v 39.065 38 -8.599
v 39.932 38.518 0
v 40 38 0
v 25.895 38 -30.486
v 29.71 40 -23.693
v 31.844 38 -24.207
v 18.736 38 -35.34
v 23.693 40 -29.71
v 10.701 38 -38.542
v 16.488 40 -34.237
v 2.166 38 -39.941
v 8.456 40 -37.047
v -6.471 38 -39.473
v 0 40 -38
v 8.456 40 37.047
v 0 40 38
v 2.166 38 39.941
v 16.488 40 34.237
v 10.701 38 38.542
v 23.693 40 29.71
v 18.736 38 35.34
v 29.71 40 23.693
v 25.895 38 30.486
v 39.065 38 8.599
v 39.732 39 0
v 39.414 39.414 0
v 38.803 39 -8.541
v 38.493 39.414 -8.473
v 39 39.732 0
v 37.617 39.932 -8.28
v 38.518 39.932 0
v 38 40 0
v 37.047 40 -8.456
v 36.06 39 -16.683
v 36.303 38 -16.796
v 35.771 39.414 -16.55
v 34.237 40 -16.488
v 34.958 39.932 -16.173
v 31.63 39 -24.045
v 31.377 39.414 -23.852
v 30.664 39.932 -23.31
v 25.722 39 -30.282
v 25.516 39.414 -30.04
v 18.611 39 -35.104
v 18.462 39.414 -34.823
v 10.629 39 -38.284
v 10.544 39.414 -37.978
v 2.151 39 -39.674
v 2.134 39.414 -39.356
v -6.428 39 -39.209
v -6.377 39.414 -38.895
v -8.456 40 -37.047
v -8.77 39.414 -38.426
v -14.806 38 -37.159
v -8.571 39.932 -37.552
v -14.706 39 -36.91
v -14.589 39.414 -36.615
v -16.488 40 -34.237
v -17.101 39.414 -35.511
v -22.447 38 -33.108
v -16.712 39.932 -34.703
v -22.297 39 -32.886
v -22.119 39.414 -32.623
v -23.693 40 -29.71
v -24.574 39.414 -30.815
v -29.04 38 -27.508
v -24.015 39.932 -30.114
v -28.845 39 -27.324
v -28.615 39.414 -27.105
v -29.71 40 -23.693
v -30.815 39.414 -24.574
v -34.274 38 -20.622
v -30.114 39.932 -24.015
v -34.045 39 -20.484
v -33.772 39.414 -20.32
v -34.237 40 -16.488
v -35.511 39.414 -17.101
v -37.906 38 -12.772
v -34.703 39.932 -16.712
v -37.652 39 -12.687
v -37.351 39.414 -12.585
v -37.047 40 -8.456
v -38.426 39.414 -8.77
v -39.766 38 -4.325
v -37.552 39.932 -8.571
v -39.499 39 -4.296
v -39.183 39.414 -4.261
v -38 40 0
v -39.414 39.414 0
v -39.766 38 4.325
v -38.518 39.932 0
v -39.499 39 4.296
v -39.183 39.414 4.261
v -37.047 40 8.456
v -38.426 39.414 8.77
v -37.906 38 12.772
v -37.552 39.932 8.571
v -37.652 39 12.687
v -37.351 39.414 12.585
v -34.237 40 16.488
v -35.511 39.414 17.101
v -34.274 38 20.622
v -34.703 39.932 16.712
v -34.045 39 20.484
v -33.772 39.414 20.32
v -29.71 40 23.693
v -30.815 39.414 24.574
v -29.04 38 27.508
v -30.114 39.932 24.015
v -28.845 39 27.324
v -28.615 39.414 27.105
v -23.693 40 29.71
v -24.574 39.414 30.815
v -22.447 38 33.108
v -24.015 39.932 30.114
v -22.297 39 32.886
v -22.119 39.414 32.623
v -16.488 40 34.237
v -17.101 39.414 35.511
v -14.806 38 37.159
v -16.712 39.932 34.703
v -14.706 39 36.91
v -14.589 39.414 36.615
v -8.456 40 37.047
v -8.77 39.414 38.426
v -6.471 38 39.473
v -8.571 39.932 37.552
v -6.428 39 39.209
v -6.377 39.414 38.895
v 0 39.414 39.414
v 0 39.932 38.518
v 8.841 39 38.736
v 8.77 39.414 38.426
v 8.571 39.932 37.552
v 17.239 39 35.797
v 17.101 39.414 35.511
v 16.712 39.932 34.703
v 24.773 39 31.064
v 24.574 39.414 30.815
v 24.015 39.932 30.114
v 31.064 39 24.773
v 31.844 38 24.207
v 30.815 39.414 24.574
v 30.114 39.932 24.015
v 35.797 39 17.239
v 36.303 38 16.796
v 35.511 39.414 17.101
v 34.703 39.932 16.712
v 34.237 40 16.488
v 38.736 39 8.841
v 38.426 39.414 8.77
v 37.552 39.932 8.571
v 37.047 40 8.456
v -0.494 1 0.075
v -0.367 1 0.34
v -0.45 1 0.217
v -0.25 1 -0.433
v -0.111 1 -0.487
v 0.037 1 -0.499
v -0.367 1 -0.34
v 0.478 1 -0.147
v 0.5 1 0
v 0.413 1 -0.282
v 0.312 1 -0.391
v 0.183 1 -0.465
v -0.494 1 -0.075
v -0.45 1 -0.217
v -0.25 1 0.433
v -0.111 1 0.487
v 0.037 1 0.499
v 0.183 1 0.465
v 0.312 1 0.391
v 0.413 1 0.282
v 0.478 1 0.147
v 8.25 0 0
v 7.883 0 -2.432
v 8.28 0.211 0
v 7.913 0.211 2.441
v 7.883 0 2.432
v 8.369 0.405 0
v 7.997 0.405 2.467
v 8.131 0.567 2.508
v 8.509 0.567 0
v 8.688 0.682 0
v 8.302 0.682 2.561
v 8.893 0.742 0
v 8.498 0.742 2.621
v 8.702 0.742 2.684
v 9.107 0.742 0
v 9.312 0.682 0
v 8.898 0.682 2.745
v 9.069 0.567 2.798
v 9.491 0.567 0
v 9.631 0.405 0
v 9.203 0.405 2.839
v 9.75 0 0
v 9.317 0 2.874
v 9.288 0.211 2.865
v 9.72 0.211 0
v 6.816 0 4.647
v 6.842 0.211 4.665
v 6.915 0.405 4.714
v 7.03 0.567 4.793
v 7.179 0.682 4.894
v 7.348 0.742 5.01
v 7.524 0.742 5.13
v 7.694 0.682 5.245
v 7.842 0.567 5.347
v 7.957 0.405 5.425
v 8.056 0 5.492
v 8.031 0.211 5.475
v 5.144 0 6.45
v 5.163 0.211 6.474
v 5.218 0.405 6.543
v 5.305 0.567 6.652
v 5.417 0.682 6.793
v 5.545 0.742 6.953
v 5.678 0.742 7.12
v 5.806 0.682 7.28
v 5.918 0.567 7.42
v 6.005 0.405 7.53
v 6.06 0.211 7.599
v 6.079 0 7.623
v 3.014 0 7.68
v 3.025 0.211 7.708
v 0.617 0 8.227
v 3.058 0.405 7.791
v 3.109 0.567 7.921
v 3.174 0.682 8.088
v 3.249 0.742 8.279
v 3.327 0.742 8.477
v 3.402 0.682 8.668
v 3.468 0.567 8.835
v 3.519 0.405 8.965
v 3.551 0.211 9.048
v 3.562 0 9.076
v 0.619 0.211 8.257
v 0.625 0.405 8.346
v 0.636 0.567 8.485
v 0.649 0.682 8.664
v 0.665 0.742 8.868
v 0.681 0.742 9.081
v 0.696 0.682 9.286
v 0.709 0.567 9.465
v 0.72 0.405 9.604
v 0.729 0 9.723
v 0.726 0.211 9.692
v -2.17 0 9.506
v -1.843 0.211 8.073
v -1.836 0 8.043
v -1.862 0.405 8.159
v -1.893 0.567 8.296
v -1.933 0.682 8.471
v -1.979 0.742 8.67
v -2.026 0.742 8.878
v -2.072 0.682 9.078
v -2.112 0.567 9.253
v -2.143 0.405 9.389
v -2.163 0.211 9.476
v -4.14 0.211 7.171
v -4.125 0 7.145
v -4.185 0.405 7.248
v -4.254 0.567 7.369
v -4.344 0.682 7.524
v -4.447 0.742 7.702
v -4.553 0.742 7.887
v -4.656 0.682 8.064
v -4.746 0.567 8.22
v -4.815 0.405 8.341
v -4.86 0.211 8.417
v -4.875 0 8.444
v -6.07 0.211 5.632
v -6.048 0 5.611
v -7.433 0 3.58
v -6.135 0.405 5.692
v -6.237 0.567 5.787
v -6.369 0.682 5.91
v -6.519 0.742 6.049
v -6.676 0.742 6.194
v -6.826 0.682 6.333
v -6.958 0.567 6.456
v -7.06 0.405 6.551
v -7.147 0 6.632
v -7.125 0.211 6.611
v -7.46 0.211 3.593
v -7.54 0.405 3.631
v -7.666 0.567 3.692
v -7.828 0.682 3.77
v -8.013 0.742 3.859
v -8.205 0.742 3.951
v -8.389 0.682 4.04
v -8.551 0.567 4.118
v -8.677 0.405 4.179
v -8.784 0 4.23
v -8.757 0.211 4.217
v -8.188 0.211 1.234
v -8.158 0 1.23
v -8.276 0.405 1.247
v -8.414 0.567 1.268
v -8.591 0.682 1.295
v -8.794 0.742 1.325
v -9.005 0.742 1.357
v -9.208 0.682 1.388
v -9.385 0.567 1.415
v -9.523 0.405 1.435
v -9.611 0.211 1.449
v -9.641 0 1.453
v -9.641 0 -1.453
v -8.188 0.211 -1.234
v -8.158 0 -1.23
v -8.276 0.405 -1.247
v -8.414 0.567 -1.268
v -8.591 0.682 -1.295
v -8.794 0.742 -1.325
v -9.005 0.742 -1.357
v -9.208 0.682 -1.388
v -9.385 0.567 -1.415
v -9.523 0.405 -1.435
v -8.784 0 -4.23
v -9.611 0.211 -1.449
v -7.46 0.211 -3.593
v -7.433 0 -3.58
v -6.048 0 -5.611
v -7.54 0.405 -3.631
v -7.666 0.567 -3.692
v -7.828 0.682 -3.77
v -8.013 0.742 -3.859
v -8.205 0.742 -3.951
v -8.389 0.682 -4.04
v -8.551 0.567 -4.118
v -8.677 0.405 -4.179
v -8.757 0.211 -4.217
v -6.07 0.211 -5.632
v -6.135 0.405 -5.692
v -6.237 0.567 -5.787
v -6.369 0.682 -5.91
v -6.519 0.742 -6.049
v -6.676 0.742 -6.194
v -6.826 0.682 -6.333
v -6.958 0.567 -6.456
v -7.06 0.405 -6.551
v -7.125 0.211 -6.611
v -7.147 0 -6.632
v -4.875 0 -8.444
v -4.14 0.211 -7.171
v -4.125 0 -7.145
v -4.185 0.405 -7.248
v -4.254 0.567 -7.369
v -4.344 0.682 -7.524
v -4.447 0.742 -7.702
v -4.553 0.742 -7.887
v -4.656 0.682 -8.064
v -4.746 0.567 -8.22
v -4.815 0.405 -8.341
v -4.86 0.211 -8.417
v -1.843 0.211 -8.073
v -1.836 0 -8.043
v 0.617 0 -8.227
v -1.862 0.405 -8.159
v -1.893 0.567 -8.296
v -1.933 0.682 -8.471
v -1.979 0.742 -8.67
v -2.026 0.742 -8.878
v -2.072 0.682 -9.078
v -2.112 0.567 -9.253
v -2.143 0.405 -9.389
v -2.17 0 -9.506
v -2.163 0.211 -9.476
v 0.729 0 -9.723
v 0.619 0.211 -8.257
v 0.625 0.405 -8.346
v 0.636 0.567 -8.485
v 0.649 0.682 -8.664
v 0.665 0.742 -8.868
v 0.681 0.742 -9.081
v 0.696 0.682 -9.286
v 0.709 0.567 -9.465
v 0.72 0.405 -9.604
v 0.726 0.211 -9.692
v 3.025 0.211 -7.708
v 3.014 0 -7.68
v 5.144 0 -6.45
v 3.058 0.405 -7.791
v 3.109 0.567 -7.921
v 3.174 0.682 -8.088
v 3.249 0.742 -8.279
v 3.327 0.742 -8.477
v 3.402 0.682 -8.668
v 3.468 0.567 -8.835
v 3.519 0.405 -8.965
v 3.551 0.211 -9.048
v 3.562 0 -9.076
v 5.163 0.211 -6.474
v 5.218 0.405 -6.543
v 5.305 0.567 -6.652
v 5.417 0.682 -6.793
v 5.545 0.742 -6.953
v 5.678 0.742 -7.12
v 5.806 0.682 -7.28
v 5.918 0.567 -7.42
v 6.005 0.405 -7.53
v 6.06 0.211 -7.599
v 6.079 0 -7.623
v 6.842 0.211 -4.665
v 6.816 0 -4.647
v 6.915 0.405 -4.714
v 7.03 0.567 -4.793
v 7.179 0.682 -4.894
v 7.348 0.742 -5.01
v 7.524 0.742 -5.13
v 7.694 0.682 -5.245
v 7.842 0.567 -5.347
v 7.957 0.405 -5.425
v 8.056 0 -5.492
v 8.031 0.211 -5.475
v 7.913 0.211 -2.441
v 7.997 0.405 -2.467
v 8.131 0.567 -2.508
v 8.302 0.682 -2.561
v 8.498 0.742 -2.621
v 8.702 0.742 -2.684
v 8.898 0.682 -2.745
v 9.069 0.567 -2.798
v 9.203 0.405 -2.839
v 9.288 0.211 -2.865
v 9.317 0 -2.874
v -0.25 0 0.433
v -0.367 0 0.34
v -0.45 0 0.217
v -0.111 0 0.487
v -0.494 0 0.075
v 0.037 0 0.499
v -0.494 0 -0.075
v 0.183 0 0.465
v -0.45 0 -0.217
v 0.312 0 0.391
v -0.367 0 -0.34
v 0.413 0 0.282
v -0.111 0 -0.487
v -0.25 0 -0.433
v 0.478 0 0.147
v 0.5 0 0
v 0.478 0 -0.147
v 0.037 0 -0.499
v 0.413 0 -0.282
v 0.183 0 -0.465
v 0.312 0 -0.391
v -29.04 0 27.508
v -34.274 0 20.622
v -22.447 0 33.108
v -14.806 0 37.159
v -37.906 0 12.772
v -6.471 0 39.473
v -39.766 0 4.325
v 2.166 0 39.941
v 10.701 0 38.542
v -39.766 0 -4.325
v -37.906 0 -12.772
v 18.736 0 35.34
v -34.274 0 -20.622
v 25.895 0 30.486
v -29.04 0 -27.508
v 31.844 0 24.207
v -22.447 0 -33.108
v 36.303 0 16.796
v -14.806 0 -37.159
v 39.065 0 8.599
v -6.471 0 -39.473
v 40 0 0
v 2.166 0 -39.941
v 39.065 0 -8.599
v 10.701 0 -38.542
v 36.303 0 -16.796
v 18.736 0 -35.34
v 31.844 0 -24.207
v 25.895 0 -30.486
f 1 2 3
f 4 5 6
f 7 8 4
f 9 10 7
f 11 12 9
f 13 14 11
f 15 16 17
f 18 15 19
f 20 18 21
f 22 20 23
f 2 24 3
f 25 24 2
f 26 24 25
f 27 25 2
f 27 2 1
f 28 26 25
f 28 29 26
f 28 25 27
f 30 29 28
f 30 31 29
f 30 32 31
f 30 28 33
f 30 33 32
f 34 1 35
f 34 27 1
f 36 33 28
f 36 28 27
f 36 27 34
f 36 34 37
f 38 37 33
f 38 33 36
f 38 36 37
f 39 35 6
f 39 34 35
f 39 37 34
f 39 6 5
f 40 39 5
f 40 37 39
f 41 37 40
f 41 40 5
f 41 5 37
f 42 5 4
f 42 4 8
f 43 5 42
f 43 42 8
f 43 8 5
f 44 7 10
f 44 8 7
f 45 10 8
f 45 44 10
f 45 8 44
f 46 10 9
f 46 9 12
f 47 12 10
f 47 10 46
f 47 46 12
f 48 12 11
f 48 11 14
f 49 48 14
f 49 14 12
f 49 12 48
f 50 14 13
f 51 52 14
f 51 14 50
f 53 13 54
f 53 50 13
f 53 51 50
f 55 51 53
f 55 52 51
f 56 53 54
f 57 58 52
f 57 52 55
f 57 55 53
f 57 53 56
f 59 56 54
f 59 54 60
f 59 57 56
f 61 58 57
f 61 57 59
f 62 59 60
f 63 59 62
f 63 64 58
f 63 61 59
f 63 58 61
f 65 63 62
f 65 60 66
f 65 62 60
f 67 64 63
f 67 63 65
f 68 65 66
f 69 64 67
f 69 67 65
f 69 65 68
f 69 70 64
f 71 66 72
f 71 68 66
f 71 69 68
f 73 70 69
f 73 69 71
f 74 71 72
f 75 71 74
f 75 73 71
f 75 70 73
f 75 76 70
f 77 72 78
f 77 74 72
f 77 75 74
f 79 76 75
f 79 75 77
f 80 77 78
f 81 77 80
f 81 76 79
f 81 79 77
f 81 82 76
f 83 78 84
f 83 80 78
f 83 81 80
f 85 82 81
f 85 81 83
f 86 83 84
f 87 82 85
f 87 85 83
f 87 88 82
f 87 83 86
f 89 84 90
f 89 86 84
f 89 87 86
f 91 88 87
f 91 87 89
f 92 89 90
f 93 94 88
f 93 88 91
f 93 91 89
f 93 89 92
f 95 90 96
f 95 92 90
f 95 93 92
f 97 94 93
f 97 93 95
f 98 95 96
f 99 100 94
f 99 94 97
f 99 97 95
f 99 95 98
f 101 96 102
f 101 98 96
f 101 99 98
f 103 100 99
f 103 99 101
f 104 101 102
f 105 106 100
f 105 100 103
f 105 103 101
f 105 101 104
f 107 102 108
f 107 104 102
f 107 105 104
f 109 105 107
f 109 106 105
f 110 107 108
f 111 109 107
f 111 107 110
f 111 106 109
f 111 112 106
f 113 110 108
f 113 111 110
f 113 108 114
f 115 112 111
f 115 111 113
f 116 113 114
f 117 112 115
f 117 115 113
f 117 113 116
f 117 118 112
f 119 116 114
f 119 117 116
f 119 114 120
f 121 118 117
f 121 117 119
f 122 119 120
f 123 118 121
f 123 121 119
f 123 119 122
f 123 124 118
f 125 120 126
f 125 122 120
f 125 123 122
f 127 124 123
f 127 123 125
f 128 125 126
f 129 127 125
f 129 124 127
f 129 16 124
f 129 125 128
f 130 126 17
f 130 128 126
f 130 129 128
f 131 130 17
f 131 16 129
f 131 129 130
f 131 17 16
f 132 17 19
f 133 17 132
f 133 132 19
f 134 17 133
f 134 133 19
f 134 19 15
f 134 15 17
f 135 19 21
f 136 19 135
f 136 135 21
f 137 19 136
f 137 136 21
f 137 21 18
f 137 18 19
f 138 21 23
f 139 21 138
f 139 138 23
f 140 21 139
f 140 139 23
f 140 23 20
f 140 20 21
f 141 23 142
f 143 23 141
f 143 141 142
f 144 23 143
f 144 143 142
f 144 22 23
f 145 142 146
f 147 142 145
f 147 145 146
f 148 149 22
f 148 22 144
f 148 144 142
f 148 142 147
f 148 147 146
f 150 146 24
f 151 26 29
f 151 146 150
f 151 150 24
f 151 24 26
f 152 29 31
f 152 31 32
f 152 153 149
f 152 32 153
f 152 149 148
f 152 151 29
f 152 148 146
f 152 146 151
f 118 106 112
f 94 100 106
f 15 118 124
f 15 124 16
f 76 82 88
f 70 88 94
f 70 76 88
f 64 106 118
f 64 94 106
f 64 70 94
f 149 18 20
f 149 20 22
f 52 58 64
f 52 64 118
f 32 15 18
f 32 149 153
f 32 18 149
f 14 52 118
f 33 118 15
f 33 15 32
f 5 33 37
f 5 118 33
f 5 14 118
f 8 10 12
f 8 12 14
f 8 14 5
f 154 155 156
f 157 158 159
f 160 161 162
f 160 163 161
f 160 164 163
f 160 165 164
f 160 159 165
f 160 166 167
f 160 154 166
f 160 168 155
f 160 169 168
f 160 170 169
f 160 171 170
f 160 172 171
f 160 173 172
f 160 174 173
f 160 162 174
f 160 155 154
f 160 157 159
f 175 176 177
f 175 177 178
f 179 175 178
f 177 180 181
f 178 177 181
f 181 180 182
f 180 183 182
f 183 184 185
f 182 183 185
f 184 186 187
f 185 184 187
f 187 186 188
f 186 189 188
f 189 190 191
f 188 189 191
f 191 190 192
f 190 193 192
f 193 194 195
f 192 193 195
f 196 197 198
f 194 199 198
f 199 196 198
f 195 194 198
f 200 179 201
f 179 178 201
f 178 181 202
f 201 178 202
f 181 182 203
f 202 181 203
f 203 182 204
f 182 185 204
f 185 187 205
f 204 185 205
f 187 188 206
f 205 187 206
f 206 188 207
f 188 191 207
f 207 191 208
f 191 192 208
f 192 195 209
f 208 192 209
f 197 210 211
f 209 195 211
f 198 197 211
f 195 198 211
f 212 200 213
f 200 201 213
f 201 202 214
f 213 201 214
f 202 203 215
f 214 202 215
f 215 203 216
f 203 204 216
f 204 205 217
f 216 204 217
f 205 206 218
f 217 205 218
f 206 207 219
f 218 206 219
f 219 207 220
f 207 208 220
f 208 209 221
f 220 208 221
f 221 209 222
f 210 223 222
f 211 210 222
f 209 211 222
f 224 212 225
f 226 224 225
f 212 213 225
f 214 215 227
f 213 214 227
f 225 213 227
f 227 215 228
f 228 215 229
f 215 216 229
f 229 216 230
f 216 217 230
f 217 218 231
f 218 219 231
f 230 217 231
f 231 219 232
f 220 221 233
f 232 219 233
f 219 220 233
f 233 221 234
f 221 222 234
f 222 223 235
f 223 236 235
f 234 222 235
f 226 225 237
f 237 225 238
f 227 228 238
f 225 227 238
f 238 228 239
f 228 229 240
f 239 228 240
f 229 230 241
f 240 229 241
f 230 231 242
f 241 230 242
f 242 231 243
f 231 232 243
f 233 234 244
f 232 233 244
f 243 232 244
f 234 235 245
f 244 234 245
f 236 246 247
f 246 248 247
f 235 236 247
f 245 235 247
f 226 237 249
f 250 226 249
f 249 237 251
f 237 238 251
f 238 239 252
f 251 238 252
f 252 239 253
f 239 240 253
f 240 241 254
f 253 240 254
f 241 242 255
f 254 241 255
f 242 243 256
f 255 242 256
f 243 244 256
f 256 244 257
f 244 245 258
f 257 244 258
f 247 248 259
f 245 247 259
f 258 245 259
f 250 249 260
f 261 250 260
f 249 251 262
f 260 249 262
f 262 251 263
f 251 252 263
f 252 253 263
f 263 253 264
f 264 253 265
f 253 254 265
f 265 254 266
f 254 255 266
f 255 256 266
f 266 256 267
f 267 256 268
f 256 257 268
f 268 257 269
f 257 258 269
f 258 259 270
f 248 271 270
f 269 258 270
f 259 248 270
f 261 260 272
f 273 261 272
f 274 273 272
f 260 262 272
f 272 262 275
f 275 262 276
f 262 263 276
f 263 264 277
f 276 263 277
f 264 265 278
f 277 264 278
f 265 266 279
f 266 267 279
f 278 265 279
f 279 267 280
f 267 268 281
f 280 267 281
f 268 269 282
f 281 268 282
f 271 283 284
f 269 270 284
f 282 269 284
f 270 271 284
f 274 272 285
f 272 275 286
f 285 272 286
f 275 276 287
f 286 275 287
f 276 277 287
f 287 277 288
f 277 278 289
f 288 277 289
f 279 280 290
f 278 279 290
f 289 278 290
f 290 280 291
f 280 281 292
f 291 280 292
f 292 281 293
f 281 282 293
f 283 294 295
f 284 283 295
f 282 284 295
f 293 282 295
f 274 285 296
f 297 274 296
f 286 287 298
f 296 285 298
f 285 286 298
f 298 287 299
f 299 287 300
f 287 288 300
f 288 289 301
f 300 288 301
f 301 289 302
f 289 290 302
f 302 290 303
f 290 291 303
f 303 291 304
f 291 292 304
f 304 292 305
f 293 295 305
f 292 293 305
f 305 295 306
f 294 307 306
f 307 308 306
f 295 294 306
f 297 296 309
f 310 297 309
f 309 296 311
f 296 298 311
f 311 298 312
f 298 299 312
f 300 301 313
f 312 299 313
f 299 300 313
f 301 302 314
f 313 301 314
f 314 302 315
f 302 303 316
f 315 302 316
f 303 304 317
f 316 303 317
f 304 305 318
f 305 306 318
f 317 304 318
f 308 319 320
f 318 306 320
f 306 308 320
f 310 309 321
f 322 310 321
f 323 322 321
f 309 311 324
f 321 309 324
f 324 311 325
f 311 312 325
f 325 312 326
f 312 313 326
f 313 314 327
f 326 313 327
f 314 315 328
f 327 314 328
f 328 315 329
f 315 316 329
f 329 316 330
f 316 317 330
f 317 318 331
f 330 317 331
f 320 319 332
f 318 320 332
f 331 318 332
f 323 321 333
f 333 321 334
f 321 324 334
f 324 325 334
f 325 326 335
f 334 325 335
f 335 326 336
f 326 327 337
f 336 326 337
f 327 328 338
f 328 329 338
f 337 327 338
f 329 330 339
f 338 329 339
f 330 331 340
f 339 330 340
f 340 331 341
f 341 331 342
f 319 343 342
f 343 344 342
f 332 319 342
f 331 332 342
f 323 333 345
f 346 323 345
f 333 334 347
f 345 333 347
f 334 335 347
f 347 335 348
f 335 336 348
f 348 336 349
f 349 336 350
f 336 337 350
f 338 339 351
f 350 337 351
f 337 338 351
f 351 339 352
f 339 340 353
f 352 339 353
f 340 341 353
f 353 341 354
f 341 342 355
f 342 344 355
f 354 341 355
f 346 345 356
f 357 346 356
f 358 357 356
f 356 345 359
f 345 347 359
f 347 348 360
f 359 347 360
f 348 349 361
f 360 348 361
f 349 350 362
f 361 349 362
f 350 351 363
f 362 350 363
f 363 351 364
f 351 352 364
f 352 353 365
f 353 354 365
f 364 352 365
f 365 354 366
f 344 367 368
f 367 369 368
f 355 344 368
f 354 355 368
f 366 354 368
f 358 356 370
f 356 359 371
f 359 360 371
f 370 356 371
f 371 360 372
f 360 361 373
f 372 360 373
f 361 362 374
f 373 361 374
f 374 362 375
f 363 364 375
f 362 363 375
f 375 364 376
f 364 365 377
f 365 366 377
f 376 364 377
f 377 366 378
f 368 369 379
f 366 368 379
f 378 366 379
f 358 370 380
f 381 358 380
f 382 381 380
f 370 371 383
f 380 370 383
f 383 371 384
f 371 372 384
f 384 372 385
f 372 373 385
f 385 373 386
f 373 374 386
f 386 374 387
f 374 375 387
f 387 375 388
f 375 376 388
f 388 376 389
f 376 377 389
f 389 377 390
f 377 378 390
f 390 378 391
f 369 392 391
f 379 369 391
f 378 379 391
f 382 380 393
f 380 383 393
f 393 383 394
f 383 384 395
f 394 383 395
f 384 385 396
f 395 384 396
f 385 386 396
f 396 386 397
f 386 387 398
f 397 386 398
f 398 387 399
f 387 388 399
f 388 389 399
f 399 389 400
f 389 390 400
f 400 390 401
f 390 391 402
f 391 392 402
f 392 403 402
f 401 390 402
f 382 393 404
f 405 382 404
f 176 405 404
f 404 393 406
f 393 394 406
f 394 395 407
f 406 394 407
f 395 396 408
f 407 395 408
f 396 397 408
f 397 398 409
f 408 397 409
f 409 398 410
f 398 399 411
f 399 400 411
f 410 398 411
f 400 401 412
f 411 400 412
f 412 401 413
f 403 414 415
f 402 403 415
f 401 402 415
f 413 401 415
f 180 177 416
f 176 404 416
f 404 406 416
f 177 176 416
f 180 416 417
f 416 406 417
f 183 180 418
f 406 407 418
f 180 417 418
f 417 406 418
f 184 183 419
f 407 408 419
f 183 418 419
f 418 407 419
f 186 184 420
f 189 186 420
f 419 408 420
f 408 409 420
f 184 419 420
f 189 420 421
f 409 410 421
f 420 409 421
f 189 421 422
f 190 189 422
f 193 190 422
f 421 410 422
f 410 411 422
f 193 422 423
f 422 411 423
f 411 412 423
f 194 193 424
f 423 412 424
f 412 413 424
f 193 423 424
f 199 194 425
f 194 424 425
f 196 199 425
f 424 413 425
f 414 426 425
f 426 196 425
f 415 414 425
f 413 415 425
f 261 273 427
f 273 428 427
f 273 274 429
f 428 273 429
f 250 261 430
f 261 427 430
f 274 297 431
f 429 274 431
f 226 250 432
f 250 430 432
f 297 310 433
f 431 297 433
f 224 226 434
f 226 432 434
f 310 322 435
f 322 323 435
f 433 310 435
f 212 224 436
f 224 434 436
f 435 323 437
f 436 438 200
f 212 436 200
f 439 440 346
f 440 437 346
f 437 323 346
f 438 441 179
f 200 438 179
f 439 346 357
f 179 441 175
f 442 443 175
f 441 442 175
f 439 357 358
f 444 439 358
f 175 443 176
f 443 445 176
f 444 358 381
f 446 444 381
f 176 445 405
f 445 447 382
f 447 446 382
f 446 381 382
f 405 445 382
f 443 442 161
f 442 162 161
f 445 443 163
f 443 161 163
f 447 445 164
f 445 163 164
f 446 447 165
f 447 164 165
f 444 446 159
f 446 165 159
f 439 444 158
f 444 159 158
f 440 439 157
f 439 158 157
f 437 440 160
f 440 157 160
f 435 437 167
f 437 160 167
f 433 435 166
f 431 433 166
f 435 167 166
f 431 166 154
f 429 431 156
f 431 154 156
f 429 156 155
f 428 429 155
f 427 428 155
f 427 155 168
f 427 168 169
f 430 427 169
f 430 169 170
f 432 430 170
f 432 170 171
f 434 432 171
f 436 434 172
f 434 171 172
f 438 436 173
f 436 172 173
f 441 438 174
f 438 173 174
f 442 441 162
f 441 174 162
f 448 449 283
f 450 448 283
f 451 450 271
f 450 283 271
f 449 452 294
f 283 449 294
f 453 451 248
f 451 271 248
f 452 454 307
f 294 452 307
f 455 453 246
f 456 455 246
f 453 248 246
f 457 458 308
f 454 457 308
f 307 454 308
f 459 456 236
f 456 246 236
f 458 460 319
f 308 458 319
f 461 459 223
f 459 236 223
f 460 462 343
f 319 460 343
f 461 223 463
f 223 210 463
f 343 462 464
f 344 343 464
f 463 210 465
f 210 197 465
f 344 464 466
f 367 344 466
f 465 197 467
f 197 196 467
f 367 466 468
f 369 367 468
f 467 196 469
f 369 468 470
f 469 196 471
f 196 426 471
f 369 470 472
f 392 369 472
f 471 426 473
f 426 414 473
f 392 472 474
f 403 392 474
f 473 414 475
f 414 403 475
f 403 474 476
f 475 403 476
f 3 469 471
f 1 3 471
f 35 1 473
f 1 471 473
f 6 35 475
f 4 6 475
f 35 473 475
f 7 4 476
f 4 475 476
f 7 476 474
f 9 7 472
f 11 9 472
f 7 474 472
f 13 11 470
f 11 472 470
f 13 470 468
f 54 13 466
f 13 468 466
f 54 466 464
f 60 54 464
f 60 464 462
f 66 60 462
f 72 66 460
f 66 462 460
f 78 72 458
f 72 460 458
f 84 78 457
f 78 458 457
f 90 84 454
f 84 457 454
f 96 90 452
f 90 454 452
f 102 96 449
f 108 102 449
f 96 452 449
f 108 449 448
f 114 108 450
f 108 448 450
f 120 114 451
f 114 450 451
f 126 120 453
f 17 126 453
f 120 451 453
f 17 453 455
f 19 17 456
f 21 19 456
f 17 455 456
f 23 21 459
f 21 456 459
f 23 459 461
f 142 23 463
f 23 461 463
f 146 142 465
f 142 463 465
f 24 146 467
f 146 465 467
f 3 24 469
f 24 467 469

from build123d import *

# Parameters (mm, degrees)
SKETCH_1_R        = 40
EXTRUDE_1_DEPTH   = 40
FILLET_1_R        = 2
SWEEP_3_PROFILE_R = 0.75
SKETCH_2_W        = 0.5
SKETCH_2_H        = 1


with BuildPart() as part:
    # 草图1 → 凸台-拉伸1 (new body)
    with BuildSketch(Plane(origin=(0, 0, 0), x_dir=(1, 0, 0), z_dir=(0, 1, 0))):
        Circle(SKETCH_1_R)
    extrude(amount=EXTRUDE_1_DEPTH)

    # 圆角1
    fillet_1_edges = [part.edges().sort_by_distance(p)[0] for p in [
        (-40, 40, 0),
    ]]
    fillet(fillet_1_edges, radius=FILLET_1_R)

    # 切除-扫描3: sweep along a path in 草图3
    with BuildLine(Plane.XZ) as sweep_3_path:
        CenterArc((0, 0), 9, 0, 360)
    # 切除-扫描3 profile (on start of the path) → 切除-扫描3 (sweep, cut)
    with BuildSketch(Plane(origin=(9, 0, 0), x_dir=(1, 0, 0), z_dir=(0, 0, 1))):
        Circle(SWEEP_3_PROFILE_R)
    sweep(path=sweep_3_path.line, mode=Mode.SUBTRACT)

    # 草图2 → 切除-旋转1 (revolve, cut)
    with BuildSketch(Plane.XY):
        with Locations((0.25, 0.5)):
            Rectangle(SKETCH_2_W, SKETCH_2_H)
    revolve(axis=Axis((0, 0, 0), (0, 1, 0)), mode=Mode.SUBTRACT)


solid = part.part
